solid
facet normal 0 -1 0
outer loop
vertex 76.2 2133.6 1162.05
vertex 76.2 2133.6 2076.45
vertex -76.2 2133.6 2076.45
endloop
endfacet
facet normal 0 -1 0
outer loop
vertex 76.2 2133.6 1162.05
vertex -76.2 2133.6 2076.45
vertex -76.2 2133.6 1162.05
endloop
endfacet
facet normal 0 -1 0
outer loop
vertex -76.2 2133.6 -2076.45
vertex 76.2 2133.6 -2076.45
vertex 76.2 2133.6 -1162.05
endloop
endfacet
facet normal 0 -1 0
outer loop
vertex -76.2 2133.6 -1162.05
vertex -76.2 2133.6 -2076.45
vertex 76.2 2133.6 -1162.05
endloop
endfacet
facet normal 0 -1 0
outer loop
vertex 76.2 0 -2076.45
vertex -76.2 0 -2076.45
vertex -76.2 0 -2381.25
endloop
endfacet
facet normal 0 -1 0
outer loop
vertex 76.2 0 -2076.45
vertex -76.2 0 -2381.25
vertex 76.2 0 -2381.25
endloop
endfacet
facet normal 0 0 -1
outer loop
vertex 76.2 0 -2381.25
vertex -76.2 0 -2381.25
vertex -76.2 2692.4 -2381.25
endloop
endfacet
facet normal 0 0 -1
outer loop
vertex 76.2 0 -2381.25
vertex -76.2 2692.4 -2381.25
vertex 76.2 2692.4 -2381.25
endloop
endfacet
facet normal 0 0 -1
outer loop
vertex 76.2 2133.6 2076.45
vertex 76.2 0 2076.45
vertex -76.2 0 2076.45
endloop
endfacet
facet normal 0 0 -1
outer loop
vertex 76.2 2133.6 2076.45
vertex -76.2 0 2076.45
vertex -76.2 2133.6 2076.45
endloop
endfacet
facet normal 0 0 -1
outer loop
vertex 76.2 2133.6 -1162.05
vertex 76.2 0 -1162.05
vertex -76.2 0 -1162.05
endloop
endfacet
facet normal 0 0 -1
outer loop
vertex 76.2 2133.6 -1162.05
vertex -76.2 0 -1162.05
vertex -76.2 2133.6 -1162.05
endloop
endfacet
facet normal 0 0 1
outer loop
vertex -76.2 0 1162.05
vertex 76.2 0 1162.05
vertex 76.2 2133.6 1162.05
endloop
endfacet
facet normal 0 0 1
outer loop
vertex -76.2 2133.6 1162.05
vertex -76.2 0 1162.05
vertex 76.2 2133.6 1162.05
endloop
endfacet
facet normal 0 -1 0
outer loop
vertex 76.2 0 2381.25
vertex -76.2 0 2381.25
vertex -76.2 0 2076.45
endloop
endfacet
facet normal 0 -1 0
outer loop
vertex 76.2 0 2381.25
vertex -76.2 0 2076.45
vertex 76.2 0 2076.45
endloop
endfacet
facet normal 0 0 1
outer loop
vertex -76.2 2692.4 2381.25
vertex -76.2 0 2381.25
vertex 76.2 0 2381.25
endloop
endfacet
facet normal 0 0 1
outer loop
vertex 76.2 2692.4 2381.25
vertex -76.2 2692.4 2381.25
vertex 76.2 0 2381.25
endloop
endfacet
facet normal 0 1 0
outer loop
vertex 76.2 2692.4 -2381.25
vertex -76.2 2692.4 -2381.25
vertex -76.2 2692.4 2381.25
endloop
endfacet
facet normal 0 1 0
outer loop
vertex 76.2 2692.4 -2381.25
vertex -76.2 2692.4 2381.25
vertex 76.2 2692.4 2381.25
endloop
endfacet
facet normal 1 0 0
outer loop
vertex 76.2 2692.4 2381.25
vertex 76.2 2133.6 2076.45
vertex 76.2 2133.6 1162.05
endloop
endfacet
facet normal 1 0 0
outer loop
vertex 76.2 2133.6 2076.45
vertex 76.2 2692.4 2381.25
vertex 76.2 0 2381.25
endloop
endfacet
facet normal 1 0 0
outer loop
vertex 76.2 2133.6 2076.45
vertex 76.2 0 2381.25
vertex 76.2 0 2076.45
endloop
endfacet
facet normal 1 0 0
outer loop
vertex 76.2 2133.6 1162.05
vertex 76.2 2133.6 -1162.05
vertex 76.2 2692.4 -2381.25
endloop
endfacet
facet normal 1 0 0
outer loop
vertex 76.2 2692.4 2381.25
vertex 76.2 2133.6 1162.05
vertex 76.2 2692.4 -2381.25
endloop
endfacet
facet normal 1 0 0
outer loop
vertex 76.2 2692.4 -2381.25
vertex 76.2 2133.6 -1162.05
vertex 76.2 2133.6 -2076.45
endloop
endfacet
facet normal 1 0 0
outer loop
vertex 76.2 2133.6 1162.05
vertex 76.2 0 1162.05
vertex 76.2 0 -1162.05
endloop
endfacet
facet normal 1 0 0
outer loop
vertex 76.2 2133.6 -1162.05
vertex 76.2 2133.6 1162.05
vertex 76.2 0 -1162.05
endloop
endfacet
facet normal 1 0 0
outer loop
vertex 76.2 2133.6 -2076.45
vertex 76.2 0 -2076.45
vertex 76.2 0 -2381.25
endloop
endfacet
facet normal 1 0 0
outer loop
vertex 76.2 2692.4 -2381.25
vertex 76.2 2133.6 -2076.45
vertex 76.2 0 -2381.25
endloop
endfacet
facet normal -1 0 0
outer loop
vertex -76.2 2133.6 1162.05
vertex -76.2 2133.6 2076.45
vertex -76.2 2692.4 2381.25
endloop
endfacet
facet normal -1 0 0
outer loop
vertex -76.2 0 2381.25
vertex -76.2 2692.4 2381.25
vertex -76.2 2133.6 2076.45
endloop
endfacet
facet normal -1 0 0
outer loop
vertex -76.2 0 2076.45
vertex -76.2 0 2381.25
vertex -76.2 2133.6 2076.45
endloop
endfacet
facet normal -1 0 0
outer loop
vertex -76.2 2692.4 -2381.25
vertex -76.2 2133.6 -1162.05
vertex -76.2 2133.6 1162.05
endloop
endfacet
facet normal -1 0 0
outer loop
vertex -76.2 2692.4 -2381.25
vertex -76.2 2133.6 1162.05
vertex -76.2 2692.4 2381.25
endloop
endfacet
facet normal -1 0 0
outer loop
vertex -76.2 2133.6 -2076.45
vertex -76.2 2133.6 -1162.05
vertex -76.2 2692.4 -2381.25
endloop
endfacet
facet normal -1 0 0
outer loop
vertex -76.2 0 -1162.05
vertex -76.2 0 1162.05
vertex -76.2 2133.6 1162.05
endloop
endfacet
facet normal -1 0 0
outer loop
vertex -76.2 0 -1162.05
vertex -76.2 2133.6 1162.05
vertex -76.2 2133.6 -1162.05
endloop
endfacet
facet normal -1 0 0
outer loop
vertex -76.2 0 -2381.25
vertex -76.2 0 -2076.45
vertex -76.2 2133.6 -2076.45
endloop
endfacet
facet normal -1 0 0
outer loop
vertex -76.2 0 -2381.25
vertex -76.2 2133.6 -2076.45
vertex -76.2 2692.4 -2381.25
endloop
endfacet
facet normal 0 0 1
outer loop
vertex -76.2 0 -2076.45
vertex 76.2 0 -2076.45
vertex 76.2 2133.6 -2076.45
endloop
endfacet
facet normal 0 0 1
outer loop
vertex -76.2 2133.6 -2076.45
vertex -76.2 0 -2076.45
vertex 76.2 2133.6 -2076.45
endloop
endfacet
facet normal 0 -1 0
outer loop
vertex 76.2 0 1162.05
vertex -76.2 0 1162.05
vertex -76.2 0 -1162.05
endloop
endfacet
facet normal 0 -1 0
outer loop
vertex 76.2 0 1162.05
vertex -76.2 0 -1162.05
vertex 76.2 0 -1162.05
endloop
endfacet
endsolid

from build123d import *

# Parameters (mm, degrees)
SKETCH1_W           = 152.4
SKETCH1_H           = 4762.5
BOSS_EXTRUDE1_DEPTH = 2692.4
SKETCH2_W           = 914.4
SKETCH2_H           = 2133.6
CUT_EXTRUDE1_DEPTH  = 3598.581838194


with BuildPart() as part:
    # Sketch1 → Boss-Extrude1 (new body)
    with BuildSketch(Plane(origin=(0, 0, 0), x_dir=(1, 0, 0), z_dir=(0, 1, 0))):
        Rectangle(SKETCH1_W, SKETCH1_H)
    extrude(amount=BOSS_EXTRUDE1_DEPTH)

    # Sketch2 → Cut-Extrude1 (cut, through all)
    with BuildSketch(Plane(origin=(76.2, 0, 0), x_dir=(0, 0, -1), z_dir=(1, 0, 0))):
        with Locations((-1619.25, 1066.8)):
            Rectangle(SKETCH2_W, SKETCH2_H)
    cut_extrude1 = extrude(amount=-CUT_EXTRUDE1_DEPTH, mode=Mode.SUBTRACT)

    # Mirror1: Cut-Extrude1 across plane
    add(cut_extrude1.mirror(Plane.XY), mode=Mode.SUBTRACT)


solid = part.part
